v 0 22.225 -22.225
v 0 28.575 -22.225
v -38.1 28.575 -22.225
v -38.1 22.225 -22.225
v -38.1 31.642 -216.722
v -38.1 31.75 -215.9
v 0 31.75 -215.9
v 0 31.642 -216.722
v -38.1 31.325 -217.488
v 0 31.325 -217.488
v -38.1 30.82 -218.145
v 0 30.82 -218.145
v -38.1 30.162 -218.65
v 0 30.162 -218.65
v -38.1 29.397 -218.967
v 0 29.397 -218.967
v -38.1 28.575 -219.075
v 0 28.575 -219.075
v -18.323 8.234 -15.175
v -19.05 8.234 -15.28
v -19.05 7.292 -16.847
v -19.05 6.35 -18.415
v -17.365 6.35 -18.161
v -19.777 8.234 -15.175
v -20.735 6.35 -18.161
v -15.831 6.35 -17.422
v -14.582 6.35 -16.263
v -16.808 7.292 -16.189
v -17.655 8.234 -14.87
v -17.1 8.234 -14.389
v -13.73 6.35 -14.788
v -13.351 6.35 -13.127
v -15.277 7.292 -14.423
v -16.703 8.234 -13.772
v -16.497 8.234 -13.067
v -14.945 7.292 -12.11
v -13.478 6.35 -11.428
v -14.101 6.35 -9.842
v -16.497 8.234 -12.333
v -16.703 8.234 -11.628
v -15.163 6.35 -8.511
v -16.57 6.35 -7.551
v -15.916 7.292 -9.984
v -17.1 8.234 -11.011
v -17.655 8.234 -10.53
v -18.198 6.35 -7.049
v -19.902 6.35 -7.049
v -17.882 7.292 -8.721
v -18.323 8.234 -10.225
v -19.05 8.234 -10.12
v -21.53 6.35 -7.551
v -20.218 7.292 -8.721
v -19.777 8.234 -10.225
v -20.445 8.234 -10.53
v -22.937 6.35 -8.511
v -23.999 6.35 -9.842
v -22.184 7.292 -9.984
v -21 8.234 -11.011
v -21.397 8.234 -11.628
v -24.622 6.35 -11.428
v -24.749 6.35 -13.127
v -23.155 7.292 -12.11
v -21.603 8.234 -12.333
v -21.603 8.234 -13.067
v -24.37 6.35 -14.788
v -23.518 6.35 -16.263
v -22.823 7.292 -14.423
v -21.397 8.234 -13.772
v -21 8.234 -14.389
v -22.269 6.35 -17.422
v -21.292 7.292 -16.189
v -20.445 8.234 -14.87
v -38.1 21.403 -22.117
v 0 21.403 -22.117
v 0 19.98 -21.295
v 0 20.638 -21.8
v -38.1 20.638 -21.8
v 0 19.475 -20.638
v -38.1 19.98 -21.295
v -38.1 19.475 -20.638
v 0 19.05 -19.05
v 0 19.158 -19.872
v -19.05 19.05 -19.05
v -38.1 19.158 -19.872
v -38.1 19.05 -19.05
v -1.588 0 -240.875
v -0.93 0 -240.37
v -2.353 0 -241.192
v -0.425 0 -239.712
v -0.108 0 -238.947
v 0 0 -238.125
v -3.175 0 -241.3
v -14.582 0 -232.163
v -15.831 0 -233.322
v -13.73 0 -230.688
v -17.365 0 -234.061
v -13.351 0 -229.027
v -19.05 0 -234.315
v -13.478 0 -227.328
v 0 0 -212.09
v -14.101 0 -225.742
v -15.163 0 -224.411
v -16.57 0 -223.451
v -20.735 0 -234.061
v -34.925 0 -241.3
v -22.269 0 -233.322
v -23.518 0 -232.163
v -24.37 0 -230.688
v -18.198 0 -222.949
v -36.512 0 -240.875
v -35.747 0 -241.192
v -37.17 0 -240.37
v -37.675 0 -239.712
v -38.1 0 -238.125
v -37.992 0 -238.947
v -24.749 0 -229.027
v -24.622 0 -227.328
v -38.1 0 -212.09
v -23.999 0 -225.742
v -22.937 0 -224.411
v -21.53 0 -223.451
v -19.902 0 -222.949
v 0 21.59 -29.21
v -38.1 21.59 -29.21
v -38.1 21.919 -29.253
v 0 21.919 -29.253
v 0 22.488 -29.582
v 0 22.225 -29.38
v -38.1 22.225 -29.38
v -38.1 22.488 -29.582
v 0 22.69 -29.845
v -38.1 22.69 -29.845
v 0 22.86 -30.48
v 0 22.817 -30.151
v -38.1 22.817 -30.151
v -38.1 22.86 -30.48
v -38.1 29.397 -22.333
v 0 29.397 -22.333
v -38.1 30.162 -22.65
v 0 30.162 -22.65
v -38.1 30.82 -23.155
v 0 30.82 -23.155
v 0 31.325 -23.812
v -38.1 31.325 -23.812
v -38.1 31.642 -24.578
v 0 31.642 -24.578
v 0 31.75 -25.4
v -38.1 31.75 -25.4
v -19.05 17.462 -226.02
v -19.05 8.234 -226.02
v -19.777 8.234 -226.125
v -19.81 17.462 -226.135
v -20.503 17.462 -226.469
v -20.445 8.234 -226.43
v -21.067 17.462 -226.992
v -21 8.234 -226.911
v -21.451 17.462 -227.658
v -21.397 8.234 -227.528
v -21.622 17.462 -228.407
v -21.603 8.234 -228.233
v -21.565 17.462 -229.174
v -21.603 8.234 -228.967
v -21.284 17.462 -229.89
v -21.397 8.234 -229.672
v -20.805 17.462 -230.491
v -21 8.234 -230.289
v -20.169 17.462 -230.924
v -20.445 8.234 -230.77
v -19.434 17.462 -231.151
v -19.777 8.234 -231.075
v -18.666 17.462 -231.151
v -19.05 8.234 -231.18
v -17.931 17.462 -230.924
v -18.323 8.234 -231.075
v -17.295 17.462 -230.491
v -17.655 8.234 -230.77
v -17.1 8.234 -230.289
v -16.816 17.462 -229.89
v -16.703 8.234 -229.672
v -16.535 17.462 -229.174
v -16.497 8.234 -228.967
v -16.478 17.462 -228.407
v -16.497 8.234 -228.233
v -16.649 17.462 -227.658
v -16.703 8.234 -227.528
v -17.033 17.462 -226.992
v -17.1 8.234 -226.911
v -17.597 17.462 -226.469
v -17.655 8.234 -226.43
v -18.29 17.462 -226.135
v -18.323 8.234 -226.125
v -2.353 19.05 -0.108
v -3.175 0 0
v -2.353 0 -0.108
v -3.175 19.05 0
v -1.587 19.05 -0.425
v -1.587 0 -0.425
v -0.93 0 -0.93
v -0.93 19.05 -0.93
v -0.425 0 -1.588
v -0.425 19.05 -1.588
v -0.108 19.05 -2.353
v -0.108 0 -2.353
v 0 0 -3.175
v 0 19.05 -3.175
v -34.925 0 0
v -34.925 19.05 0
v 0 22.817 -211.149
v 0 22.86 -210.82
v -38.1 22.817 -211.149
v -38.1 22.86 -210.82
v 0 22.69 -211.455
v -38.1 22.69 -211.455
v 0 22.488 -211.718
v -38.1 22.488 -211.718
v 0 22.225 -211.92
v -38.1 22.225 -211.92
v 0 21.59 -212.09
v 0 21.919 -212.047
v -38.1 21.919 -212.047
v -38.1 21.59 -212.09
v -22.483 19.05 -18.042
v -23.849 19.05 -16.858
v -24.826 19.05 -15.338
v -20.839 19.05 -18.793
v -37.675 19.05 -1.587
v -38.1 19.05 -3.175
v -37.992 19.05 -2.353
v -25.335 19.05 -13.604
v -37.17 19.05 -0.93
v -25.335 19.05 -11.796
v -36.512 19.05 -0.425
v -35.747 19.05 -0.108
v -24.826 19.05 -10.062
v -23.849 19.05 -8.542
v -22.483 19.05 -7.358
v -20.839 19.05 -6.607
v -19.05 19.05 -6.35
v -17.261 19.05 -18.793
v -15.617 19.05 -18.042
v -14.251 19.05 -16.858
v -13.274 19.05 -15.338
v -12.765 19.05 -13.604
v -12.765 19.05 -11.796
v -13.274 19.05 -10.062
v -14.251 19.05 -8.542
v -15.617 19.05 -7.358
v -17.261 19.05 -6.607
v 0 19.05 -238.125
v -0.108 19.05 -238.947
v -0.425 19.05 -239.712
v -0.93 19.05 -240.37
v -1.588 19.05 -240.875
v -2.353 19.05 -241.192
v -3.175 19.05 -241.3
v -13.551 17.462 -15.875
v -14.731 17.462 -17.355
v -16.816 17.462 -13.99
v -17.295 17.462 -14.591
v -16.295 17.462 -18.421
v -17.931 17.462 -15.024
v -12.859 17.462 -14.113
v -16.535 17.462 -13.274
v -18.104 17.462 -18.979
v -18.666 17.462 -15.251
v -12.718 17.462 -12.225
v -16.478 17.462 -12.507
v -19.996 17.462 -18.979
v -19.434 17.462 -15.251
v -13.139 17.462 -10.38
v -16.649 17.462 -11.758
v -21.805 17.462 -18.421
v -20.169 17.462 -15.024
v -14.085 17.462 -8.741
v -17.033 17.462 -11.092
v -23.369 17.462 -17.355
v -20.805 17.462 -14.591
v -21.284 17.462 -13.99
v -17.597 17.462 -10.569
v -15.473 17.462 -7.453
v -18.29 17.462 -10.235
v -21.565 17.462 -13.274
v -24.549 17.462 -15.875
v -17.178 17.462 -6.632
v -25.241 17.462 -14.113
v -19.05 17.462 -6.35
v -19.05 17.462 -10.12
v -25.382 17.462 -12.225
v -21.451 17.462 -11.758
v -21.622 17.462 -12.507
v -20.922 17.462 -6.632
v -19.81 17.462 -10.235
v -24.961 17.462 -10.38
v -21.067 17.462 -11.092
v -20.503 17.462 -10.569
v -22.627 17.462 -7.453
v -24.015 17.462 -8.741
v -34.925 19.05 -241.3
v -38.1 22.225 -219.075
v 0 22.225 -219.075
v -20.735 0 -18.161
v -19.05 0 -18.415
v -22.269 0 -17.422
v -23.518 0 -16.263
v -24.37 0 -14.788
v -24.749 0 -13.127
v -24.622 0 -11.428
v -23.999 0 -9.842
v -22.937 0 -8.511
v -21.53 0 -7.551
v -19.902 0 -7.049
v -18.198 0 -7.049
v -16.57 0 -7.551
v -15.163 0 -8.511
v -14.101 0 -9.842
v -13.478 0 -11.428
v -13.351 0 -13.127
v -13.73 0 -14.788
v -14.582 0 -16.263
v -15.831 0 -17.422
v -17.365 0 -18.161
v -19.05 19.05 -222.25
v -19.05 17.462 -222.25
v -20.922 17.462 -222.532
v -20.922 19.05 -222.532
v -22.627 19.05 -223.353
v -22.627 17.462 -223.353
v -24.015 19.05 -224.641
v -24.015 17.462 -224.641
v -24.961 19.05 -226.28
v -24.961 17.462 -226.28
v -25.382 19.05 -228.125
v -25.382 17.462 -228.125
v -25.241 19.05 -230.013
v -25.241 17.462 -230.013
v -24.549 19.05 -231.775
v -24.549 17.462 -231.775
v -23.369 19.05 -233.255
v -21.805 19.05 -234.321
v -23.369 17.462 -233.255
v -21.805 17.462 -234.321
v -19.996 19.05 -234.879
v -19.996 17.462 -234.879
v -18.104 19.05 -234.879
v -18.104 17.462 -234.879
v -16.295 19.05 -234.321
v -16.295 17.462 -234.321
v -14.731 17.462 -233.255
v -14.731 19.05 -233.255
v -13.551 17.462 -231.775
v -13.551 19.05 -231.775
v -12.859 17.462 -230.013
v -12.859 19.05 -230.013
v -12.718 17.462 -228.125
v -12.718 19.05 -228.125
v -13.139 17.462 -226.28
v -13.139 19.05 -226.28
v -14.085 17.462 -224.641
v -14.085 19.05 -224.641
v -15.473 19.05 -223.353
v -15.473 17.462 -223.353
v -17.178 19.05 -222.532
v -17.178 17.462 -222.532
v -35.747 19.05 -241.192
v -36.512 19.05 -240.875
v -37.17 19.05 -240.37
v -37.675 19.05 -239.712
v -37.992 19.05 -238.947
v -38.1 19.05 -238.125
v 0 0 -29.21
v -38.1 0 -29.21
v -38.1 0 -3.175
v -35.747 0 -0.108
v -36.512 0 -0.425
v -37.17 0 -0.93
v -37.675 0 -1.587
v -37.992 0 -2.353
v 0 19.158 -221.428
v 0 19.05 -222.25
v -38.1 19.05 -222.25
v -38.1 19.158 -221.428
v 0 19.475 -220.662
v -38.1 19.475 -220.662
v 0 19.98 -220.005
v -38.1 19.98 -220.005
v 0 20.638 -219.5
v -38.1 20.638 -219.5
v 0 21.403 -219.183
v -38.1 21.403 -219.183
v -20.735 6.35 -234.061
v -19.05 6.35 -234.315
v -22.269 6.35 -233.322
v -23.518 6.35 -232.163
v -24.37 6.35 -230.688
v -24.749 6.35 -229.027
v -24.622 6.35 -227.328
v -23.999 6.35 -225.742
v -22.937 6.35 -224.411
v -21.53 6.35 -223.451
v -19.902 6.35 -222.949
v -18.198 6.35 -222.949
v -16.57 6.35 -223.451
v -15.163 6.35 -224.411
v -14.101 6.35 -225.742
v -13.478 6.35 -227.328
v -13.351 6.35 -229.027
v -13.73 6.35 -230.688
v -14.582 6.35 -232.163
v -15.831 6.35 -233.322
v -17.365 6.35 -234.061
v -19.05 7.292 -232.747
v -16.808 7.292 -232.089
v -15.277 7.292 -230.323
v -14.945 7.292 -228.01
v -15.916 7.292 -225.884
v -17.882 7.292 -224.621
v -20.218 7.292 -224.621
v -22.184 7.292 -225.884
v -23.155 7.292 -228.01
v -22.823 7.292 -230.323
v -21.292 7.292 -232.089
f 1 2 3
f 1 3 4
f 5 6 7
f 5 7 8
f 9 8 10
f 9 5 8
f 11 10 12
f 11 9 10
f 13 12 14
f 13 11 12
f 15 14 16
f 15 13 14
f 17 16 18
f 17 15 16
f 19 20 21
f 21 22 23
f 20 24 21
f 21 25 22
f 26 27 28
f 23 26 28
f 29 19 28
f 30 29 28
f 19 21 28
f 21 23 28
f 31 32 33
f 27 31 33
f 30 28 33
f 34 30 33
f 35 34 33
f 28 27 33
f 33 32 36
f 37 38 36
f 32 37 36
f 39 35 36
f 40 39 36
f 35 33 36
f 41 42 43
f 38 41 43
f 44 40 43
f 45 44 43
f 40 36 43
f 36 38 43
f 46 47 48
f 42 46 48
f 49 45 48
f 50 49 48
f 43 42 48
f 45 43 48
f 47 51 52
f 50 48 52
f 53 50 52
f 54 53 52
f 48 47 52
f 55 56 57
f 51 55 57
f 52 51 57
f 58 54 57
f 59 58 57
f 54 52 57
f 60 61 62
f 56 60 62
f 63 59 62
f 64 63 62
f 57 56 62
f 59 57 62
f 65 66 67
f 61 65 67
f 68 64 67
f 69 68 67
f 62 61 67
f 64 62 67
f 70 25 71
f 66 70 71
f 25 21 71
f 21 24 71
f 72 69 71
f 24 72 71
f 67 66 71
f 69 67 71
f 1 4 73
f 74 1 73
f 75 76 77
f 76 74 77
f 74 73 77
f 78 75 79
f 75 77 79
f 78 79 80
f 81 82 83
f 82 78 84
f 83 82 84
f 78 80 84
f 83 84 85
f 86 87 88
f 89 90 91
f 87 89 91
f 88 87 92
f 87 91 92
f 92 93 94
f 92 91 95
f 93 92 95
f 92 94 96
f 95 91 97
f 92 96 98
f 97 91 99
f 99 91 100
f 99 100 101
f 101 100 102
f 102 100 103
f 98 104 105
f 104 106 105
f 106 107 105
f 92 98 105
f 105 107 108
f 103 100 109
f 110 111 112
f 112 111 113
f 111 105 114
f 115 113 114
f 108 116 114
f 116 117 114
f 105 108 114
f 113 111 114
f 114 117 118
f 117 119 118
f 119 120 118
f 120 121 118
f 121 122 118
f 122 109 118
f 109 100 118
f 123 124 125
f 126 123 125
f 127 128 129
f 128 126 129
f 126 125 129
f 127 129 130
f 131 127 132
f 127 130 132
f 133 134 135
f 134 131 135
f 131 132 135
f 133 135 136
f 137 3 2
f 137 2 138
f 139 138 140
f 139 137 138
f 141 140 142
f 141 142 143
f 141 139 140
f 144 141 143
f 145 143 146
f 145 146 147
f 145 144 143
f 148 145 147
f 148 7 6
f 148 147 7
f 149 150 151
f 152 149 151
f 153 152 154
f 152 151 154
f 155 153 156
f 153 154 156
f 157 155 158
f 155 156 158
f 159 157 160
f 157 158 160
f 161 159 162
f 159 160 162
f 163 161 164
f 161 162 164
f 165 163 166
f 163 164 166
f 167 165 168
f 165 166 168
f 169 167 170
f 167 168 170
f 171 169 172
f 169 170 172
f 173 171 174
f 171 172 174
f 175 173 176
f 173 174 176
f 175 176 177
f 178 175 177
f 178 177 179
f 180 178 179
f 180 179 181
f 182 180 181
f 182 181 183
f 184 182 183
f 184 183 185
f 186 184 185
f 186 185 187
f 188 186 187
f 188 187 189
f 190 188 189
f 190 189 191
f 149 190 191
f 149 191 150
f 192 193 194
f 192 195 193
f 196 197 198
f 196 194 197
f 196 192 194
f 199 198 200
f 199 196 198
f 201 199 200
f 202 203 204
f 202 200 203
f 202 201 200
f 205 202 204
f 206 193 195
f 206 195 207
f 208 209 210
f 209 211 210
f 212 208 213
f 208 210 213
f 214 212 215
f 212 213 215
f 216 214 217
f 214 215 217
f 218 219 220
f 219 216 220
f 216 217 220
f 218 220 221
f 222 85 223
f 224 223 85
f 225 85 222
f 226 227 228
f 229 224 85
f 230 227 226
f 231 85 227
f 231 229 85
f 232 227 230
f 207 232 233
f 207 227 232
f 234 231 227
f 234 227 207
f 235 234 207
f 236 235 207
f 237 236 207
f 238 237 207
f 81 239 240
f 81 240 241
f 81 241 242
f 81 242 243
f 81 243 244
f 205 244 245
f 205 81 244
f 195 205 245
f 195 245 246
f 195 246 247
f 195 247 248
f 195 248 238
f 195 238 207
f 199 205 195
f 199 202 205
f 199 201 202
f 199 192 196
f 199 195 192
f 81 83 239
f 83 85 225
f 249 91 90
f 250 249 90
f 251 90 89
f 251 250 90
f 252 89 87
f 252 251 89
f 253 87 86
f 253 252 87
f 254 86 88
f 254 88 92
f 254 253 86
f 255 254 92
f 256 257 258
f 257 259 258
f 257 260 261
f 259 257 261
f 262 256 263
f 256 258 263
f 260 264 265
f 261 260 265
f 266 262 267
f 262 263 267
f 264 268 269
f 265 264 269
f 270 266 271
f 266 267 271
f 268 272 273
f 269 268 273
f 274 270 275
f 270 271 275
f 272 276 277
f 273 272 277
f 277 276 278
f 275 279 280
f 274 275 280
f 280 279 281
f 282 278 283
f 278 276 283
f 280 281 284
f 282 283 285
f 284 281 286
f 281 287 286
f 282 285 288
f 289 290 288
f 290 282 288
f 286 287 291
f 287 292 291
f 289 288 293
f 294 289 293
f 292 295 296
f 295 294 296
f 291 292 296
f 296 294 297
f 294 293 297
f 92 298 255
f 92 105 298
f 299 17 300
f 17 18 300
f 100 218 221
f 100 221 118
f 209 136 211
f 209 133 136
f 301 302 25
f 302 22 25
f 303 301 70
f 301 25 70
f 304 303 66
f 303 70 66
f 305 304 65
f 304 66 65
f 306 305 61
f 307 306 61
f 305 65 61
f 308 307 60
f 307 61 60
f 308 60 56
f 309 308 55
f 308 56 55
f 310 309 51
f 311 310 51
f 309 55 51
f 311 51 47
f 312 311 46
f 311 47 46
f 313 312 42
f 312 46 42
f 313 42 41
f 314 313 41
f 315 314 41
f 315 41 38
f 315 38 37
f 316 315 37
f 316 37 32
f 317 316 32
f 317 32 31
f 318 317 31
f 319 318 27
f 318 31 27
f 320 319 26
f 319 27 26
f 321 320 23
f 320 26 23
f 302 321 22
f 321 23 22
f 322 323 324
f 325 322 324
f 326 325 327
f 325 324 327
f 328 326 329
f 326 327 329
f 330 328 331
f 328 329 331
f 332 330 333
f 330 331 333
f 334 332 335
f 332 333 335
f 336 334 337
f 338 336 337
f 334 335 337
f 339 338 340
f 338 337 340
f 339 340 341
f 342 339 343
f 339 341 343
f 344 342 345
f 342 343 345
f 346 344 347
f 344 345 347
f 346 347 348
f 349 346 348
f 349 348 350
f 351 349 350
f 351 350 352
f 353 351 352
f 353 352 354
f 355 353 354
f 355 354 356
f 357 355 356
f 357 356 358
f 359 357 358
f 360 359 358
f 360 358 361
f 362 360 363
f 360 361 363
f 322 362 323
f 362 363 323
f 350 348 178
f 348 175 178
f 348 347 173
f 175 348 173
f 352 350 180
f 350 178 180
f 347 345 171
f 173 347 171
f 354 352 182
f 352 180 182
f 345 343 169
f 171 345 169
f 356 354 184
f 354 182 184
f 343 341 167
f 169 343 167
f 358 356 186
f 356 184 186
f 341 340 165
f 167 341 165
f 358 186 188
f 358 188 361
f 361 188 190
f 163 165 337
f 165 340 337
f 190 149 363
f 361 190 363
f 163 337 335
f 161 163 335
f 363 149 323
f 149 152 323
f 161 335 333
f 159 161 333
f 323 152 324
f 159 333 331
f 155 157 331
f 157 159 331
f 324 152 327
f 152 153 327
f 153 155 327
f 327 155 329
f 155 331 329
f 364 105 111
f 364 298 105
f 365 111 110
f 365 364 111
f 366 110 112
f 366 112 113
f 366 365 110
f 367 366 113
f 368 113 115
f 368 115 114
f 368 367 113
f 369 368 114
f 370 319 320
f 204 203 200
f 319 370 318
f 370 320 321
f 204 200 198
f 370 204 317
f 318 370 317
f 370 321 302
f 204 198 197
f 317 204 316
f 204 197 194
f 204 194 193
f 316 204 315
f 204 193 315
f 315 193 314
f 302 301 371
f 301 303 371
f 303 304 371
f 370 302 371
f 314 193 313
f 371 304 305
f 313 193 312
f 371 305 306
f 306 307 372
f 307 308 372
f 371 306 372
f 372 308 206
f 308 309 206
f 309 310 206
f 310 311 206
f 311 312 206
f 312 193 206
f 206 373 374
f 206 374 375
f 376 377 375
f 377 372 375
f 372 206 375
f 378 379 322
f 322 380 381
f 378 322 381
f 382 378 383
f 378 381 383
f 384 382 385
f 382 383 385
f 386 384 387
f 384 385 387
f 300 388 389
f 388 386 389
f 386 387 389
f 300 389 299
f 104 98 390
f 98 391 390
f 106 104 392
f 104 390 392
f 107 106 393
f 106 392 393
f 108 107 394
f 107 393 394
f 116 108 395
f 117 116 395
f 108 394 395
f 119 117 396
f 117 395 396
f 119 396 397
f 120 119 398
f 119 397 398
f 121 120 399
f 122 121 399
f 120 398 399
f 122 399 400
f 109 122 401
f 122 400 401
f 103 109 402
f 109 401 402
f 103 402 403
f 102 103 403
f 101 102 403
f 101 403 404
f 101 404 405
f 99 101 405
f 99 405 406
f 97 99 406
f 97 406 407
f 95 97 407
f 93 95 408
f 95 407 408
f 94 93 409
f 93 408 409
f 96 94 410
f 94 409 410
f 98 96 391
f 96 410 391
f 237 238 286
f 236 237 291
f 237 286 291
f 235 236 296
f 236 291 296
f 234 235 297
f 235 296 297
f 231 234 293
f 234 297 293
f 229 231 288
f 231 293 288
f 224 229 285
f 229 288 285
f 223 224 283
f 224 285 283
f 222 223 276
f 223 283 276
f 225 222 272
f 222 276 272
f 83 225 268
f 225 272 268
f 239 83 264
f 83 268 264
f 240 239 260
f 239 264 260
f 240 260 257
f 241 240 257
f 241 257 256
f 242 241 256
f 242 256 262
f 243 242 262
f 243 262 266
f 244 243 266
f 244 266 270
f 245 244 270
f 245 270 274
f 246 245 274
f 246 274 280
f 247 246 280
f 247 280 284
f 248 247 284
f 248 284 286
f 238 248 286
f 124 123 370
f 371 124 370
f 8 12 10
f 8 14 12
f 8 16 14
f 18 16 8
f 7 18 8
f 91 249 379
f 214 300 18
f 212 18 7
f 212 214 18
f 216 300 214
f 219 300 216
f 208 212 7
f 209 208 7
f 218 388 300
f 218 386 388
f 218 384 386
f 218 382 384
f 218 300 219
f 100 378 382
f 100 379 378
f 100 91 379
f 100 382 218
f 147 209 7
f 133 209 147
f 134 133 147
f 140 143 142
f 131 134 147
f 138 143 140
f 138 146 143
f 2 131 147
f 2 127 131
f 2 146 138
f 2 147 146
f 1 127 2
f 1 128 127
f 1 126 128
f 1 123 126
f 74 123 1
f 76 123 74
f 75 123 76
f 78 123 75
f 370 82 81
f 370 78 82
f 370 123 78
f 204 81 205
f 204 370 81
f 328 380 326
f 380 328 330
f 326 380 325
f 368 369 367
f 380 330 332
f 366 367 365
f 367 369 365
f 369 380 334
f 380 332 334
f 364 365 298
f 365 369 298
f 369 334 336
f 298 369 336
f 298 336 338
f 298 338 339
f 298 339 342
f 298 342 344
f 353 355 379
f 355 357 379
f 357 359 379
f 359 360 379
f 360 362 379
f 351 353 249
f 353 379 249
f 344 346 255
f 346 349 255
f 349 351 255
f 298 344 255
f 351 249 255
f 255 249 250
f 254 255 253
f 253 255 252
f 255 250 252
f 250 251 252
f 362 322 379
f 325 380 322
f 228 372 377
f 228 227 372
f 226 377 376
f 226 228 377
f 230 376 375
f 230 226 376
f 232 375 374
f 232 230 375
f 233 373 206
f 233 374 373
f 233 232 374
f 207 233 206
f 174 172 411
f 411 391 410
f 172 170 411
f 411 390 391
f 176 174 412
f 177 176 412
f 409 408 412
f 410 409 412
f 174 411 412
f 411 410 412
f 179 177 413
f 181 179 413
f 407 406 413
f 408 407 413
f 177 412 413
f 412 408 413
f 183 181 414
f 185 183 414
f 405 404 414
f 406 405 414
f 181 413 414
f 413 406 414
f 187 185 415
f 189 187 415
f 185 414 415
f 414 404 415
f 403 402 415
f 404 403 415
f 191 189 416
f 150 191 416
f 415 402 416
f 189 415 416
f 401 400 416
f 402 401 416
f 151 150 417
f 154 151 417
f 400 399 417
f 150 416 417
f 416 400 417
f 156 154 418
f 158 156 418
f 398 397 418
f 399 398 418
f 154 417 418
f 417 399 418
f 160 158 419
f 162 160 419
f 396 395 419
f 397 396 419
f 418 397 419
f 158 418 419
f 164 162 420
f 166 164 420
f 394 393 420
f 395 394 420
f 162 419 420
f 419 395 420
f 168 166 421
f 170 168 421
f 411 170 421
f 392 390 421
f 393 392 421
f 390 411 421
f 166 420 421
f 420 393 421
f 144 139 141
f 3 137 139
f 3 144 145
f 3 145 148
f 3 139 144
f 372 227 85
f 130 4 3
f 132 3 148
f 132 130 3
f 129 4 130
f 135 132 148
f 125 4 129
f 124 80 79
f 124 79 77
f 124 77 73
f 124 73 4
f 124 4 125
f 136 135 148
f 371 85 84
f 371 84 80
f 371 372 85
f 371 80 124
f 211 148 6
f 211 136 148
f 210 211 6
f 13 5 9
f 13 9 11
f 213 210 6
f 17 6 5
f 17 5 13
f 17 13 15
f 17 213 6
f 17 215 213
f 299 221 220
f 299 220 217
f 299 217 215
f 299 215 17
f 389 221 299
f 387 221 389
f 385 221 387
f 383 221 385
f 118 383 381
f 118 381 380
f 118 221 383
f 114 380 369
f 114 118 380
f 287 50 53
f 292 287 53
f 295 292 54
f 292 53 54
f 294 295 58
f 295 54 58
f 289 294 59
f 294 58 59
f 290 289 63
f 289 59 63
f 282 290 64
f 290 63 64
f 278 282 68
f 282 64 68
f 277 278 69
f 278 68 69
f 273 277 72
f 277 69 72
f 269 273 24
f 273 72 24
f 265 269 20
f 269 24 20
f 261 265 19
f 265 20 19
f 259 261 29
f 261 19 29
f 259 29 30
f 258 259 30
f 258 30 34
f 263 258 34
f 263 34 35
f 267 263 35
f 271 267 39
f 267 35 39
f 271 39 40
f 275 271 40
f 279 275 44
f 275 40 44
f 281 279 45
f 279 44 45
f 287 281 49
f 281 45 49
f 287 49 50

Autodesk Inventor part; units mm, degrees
ref_plane "YZ Plane" through (0, 0, 0) normal (1, 0, 0) x (0, 1, 0)
ref_plane "XZ Plane" through (0, 0, 0) normal (0, 1, 0) x (-1, 0, 0)
ref_plane "XY Plane" through (0, 0, 0) normal (0, 0, 1) x (1, 0, 0)
sketch "Sketch1" plane through (0, 0, 0) normal (0, 1, 0) x (-1, 0, 0)
  line L0 (0, 0) -> (38.1, 0)
  line L1 (38.1, 0) -> (38.1, -241.3)
  line L2 (38.1, -241.3) -> (0, -241.3)
  line L3 (0, -241.3) -> (0, 0)
  dimension "d0" = 38.1
  dimension "d1" = 241.3
extrude "Extrusion1" add sketch "Sketch1" along normal blind 31.75
sketch "Sketch2" plane through (0, 0, 0) normal (1, 0, 0) x (0, 0, -1)
  line L0 (241.3, 0) -> (0, 0) projected
  line L1 (120.65, 0) -> (120.65, 22.86)
  line L2 (120.65, 22.86) -> (212.09, 22.86)
  line L3 (241.3, 31.75) -> (0, 31.75) projected
  line L4 (120.65, 22.86) -> (29.21, 22.86)
  line L5 (29.21, 22.86) -> (29.21, 0)
  line L6 (212.09, 22.86) -> (212.09, 0)
  line L7 (212.09, 0) -> (29.21, 0)
  dimension "d4" = 22.86
  dimension "d5" = 91.44
  dimension "d7" = 91.44
extrude "Extrusion2" cut sketch "Sketch2" against normal through all
fillet "Fillet1" radius 1.27 2 edges at (-19.05, 22.86, -212.09) (-19.05, 22.86, -29.21)
sketch "Sketch5" plane through (0, 0, -241.3) normal (1, 0, 0) x (0, 0, -1)
  line L0 (0, 31.75) -> (-22.225, 31.75)
  line L1 (-22.225, 31.75) -> (-22.225, 19.05)
  line L2 (-22.225, 19.05) -> (0, 19.05)
  line L3 (0, 19.05) -> (0, 31.75)
  line L4 (-241.3, 0) -> (-241.3, 31.75) projected
  line L5 (-241.3, 31.75) -> (-219.075, 31.75)
  line L6 (-219.075, 31.75) -> (-219.075, 19.05)
  line L7 (-219.075, 19.05) -> (-241.3, 19.05)
  line L8 (-241.3, 19.05) -> (-241.3, 31.75)
  dimension "d29" = 22.225
  dimension "d30" = 12.7
  dimension "d31" = 22.225
  dimension "d32" = 12.7
extrude "Extrusion3" cut sketch "Sketch5" against normal through all
fillet "Fillet2" radius 3.175 4 edges at (-19.05, 19.05, -219.075) (-19.05, 31.75, -219.075) (-19.05, 31.75, -22.225) (-19.05, 19.05, -22.225)
sketch "Sketch6" plane through (-38.1, 19.05, -241.3) normal (0, 1, 0) x (1, 0, 0)
  line L0 (0, 0) -> (38.1, 0) projected
  line L1 (38.1, 0) -> (38.1, -19.05) projected
  point P0 (38.1, -241.3)
  point P1 (19.05, -12.7)
  dimension "d36" = 12.7
  dimension "d44" = 19.05
hole "Hole3" at (-19.05, 19.05, -228.6) direction (0, -1, 0) diameter 5.1594 end through all counterbore diameter 12.7 counterbore depth 1.5875
sketch "Sketch7" plane through (-38.1, 19.05, 0) normal (0, 1, 0) x (1, 0, 0)
  line L0 (38.1, 0) -> (0, 0) projected
  line L1 (38.1, 19.05) -> (38.1, 0) projected
  point P0 (19.05, 12.7)
  dimension "d45" = 12.7
  dimension "d46" = 19.05
hole "Hole4" at (-19.05, 19.05, -12.7) direction (0, -1, 0) diameter 5.1594 end through all counterbore diameter 12.7 counterbore depth 1.5875
fillet "Fillet3" radius 3.175 4 edges at (0, 9.525, 0) (-38.1, 9.525, 0) (0, 9.525, -241.3) (-38.1, 9.525, -241.3)
sketch "Sketch11" plane through (0, 0, 0) normal (0, -1, 0) x (1, 0, 0)
  circle A0 centre (-19.05, -228.6) radius 2.5797 projected
  point P0 (0, 0)
hole "Hole5" at (-19.05, 0, -228.6) direction (0, 1, 0) diameter 11.43 depth 6.35 tip angle 118
sketch "Sketch12" plane through (0, 0, 0) normal (0, -1, 0) x (1, 0, 0)
  circle A0 centre (-19.05, -12.7) radius 2.5797 projected
  point P0 (0, 0)
hole "Hole6" at (-19.05, 0, -12.7) direction (0, 1, 0) diameter 11.43 depth 6.35 tip angle 118
properties part number "Battery Strap"
